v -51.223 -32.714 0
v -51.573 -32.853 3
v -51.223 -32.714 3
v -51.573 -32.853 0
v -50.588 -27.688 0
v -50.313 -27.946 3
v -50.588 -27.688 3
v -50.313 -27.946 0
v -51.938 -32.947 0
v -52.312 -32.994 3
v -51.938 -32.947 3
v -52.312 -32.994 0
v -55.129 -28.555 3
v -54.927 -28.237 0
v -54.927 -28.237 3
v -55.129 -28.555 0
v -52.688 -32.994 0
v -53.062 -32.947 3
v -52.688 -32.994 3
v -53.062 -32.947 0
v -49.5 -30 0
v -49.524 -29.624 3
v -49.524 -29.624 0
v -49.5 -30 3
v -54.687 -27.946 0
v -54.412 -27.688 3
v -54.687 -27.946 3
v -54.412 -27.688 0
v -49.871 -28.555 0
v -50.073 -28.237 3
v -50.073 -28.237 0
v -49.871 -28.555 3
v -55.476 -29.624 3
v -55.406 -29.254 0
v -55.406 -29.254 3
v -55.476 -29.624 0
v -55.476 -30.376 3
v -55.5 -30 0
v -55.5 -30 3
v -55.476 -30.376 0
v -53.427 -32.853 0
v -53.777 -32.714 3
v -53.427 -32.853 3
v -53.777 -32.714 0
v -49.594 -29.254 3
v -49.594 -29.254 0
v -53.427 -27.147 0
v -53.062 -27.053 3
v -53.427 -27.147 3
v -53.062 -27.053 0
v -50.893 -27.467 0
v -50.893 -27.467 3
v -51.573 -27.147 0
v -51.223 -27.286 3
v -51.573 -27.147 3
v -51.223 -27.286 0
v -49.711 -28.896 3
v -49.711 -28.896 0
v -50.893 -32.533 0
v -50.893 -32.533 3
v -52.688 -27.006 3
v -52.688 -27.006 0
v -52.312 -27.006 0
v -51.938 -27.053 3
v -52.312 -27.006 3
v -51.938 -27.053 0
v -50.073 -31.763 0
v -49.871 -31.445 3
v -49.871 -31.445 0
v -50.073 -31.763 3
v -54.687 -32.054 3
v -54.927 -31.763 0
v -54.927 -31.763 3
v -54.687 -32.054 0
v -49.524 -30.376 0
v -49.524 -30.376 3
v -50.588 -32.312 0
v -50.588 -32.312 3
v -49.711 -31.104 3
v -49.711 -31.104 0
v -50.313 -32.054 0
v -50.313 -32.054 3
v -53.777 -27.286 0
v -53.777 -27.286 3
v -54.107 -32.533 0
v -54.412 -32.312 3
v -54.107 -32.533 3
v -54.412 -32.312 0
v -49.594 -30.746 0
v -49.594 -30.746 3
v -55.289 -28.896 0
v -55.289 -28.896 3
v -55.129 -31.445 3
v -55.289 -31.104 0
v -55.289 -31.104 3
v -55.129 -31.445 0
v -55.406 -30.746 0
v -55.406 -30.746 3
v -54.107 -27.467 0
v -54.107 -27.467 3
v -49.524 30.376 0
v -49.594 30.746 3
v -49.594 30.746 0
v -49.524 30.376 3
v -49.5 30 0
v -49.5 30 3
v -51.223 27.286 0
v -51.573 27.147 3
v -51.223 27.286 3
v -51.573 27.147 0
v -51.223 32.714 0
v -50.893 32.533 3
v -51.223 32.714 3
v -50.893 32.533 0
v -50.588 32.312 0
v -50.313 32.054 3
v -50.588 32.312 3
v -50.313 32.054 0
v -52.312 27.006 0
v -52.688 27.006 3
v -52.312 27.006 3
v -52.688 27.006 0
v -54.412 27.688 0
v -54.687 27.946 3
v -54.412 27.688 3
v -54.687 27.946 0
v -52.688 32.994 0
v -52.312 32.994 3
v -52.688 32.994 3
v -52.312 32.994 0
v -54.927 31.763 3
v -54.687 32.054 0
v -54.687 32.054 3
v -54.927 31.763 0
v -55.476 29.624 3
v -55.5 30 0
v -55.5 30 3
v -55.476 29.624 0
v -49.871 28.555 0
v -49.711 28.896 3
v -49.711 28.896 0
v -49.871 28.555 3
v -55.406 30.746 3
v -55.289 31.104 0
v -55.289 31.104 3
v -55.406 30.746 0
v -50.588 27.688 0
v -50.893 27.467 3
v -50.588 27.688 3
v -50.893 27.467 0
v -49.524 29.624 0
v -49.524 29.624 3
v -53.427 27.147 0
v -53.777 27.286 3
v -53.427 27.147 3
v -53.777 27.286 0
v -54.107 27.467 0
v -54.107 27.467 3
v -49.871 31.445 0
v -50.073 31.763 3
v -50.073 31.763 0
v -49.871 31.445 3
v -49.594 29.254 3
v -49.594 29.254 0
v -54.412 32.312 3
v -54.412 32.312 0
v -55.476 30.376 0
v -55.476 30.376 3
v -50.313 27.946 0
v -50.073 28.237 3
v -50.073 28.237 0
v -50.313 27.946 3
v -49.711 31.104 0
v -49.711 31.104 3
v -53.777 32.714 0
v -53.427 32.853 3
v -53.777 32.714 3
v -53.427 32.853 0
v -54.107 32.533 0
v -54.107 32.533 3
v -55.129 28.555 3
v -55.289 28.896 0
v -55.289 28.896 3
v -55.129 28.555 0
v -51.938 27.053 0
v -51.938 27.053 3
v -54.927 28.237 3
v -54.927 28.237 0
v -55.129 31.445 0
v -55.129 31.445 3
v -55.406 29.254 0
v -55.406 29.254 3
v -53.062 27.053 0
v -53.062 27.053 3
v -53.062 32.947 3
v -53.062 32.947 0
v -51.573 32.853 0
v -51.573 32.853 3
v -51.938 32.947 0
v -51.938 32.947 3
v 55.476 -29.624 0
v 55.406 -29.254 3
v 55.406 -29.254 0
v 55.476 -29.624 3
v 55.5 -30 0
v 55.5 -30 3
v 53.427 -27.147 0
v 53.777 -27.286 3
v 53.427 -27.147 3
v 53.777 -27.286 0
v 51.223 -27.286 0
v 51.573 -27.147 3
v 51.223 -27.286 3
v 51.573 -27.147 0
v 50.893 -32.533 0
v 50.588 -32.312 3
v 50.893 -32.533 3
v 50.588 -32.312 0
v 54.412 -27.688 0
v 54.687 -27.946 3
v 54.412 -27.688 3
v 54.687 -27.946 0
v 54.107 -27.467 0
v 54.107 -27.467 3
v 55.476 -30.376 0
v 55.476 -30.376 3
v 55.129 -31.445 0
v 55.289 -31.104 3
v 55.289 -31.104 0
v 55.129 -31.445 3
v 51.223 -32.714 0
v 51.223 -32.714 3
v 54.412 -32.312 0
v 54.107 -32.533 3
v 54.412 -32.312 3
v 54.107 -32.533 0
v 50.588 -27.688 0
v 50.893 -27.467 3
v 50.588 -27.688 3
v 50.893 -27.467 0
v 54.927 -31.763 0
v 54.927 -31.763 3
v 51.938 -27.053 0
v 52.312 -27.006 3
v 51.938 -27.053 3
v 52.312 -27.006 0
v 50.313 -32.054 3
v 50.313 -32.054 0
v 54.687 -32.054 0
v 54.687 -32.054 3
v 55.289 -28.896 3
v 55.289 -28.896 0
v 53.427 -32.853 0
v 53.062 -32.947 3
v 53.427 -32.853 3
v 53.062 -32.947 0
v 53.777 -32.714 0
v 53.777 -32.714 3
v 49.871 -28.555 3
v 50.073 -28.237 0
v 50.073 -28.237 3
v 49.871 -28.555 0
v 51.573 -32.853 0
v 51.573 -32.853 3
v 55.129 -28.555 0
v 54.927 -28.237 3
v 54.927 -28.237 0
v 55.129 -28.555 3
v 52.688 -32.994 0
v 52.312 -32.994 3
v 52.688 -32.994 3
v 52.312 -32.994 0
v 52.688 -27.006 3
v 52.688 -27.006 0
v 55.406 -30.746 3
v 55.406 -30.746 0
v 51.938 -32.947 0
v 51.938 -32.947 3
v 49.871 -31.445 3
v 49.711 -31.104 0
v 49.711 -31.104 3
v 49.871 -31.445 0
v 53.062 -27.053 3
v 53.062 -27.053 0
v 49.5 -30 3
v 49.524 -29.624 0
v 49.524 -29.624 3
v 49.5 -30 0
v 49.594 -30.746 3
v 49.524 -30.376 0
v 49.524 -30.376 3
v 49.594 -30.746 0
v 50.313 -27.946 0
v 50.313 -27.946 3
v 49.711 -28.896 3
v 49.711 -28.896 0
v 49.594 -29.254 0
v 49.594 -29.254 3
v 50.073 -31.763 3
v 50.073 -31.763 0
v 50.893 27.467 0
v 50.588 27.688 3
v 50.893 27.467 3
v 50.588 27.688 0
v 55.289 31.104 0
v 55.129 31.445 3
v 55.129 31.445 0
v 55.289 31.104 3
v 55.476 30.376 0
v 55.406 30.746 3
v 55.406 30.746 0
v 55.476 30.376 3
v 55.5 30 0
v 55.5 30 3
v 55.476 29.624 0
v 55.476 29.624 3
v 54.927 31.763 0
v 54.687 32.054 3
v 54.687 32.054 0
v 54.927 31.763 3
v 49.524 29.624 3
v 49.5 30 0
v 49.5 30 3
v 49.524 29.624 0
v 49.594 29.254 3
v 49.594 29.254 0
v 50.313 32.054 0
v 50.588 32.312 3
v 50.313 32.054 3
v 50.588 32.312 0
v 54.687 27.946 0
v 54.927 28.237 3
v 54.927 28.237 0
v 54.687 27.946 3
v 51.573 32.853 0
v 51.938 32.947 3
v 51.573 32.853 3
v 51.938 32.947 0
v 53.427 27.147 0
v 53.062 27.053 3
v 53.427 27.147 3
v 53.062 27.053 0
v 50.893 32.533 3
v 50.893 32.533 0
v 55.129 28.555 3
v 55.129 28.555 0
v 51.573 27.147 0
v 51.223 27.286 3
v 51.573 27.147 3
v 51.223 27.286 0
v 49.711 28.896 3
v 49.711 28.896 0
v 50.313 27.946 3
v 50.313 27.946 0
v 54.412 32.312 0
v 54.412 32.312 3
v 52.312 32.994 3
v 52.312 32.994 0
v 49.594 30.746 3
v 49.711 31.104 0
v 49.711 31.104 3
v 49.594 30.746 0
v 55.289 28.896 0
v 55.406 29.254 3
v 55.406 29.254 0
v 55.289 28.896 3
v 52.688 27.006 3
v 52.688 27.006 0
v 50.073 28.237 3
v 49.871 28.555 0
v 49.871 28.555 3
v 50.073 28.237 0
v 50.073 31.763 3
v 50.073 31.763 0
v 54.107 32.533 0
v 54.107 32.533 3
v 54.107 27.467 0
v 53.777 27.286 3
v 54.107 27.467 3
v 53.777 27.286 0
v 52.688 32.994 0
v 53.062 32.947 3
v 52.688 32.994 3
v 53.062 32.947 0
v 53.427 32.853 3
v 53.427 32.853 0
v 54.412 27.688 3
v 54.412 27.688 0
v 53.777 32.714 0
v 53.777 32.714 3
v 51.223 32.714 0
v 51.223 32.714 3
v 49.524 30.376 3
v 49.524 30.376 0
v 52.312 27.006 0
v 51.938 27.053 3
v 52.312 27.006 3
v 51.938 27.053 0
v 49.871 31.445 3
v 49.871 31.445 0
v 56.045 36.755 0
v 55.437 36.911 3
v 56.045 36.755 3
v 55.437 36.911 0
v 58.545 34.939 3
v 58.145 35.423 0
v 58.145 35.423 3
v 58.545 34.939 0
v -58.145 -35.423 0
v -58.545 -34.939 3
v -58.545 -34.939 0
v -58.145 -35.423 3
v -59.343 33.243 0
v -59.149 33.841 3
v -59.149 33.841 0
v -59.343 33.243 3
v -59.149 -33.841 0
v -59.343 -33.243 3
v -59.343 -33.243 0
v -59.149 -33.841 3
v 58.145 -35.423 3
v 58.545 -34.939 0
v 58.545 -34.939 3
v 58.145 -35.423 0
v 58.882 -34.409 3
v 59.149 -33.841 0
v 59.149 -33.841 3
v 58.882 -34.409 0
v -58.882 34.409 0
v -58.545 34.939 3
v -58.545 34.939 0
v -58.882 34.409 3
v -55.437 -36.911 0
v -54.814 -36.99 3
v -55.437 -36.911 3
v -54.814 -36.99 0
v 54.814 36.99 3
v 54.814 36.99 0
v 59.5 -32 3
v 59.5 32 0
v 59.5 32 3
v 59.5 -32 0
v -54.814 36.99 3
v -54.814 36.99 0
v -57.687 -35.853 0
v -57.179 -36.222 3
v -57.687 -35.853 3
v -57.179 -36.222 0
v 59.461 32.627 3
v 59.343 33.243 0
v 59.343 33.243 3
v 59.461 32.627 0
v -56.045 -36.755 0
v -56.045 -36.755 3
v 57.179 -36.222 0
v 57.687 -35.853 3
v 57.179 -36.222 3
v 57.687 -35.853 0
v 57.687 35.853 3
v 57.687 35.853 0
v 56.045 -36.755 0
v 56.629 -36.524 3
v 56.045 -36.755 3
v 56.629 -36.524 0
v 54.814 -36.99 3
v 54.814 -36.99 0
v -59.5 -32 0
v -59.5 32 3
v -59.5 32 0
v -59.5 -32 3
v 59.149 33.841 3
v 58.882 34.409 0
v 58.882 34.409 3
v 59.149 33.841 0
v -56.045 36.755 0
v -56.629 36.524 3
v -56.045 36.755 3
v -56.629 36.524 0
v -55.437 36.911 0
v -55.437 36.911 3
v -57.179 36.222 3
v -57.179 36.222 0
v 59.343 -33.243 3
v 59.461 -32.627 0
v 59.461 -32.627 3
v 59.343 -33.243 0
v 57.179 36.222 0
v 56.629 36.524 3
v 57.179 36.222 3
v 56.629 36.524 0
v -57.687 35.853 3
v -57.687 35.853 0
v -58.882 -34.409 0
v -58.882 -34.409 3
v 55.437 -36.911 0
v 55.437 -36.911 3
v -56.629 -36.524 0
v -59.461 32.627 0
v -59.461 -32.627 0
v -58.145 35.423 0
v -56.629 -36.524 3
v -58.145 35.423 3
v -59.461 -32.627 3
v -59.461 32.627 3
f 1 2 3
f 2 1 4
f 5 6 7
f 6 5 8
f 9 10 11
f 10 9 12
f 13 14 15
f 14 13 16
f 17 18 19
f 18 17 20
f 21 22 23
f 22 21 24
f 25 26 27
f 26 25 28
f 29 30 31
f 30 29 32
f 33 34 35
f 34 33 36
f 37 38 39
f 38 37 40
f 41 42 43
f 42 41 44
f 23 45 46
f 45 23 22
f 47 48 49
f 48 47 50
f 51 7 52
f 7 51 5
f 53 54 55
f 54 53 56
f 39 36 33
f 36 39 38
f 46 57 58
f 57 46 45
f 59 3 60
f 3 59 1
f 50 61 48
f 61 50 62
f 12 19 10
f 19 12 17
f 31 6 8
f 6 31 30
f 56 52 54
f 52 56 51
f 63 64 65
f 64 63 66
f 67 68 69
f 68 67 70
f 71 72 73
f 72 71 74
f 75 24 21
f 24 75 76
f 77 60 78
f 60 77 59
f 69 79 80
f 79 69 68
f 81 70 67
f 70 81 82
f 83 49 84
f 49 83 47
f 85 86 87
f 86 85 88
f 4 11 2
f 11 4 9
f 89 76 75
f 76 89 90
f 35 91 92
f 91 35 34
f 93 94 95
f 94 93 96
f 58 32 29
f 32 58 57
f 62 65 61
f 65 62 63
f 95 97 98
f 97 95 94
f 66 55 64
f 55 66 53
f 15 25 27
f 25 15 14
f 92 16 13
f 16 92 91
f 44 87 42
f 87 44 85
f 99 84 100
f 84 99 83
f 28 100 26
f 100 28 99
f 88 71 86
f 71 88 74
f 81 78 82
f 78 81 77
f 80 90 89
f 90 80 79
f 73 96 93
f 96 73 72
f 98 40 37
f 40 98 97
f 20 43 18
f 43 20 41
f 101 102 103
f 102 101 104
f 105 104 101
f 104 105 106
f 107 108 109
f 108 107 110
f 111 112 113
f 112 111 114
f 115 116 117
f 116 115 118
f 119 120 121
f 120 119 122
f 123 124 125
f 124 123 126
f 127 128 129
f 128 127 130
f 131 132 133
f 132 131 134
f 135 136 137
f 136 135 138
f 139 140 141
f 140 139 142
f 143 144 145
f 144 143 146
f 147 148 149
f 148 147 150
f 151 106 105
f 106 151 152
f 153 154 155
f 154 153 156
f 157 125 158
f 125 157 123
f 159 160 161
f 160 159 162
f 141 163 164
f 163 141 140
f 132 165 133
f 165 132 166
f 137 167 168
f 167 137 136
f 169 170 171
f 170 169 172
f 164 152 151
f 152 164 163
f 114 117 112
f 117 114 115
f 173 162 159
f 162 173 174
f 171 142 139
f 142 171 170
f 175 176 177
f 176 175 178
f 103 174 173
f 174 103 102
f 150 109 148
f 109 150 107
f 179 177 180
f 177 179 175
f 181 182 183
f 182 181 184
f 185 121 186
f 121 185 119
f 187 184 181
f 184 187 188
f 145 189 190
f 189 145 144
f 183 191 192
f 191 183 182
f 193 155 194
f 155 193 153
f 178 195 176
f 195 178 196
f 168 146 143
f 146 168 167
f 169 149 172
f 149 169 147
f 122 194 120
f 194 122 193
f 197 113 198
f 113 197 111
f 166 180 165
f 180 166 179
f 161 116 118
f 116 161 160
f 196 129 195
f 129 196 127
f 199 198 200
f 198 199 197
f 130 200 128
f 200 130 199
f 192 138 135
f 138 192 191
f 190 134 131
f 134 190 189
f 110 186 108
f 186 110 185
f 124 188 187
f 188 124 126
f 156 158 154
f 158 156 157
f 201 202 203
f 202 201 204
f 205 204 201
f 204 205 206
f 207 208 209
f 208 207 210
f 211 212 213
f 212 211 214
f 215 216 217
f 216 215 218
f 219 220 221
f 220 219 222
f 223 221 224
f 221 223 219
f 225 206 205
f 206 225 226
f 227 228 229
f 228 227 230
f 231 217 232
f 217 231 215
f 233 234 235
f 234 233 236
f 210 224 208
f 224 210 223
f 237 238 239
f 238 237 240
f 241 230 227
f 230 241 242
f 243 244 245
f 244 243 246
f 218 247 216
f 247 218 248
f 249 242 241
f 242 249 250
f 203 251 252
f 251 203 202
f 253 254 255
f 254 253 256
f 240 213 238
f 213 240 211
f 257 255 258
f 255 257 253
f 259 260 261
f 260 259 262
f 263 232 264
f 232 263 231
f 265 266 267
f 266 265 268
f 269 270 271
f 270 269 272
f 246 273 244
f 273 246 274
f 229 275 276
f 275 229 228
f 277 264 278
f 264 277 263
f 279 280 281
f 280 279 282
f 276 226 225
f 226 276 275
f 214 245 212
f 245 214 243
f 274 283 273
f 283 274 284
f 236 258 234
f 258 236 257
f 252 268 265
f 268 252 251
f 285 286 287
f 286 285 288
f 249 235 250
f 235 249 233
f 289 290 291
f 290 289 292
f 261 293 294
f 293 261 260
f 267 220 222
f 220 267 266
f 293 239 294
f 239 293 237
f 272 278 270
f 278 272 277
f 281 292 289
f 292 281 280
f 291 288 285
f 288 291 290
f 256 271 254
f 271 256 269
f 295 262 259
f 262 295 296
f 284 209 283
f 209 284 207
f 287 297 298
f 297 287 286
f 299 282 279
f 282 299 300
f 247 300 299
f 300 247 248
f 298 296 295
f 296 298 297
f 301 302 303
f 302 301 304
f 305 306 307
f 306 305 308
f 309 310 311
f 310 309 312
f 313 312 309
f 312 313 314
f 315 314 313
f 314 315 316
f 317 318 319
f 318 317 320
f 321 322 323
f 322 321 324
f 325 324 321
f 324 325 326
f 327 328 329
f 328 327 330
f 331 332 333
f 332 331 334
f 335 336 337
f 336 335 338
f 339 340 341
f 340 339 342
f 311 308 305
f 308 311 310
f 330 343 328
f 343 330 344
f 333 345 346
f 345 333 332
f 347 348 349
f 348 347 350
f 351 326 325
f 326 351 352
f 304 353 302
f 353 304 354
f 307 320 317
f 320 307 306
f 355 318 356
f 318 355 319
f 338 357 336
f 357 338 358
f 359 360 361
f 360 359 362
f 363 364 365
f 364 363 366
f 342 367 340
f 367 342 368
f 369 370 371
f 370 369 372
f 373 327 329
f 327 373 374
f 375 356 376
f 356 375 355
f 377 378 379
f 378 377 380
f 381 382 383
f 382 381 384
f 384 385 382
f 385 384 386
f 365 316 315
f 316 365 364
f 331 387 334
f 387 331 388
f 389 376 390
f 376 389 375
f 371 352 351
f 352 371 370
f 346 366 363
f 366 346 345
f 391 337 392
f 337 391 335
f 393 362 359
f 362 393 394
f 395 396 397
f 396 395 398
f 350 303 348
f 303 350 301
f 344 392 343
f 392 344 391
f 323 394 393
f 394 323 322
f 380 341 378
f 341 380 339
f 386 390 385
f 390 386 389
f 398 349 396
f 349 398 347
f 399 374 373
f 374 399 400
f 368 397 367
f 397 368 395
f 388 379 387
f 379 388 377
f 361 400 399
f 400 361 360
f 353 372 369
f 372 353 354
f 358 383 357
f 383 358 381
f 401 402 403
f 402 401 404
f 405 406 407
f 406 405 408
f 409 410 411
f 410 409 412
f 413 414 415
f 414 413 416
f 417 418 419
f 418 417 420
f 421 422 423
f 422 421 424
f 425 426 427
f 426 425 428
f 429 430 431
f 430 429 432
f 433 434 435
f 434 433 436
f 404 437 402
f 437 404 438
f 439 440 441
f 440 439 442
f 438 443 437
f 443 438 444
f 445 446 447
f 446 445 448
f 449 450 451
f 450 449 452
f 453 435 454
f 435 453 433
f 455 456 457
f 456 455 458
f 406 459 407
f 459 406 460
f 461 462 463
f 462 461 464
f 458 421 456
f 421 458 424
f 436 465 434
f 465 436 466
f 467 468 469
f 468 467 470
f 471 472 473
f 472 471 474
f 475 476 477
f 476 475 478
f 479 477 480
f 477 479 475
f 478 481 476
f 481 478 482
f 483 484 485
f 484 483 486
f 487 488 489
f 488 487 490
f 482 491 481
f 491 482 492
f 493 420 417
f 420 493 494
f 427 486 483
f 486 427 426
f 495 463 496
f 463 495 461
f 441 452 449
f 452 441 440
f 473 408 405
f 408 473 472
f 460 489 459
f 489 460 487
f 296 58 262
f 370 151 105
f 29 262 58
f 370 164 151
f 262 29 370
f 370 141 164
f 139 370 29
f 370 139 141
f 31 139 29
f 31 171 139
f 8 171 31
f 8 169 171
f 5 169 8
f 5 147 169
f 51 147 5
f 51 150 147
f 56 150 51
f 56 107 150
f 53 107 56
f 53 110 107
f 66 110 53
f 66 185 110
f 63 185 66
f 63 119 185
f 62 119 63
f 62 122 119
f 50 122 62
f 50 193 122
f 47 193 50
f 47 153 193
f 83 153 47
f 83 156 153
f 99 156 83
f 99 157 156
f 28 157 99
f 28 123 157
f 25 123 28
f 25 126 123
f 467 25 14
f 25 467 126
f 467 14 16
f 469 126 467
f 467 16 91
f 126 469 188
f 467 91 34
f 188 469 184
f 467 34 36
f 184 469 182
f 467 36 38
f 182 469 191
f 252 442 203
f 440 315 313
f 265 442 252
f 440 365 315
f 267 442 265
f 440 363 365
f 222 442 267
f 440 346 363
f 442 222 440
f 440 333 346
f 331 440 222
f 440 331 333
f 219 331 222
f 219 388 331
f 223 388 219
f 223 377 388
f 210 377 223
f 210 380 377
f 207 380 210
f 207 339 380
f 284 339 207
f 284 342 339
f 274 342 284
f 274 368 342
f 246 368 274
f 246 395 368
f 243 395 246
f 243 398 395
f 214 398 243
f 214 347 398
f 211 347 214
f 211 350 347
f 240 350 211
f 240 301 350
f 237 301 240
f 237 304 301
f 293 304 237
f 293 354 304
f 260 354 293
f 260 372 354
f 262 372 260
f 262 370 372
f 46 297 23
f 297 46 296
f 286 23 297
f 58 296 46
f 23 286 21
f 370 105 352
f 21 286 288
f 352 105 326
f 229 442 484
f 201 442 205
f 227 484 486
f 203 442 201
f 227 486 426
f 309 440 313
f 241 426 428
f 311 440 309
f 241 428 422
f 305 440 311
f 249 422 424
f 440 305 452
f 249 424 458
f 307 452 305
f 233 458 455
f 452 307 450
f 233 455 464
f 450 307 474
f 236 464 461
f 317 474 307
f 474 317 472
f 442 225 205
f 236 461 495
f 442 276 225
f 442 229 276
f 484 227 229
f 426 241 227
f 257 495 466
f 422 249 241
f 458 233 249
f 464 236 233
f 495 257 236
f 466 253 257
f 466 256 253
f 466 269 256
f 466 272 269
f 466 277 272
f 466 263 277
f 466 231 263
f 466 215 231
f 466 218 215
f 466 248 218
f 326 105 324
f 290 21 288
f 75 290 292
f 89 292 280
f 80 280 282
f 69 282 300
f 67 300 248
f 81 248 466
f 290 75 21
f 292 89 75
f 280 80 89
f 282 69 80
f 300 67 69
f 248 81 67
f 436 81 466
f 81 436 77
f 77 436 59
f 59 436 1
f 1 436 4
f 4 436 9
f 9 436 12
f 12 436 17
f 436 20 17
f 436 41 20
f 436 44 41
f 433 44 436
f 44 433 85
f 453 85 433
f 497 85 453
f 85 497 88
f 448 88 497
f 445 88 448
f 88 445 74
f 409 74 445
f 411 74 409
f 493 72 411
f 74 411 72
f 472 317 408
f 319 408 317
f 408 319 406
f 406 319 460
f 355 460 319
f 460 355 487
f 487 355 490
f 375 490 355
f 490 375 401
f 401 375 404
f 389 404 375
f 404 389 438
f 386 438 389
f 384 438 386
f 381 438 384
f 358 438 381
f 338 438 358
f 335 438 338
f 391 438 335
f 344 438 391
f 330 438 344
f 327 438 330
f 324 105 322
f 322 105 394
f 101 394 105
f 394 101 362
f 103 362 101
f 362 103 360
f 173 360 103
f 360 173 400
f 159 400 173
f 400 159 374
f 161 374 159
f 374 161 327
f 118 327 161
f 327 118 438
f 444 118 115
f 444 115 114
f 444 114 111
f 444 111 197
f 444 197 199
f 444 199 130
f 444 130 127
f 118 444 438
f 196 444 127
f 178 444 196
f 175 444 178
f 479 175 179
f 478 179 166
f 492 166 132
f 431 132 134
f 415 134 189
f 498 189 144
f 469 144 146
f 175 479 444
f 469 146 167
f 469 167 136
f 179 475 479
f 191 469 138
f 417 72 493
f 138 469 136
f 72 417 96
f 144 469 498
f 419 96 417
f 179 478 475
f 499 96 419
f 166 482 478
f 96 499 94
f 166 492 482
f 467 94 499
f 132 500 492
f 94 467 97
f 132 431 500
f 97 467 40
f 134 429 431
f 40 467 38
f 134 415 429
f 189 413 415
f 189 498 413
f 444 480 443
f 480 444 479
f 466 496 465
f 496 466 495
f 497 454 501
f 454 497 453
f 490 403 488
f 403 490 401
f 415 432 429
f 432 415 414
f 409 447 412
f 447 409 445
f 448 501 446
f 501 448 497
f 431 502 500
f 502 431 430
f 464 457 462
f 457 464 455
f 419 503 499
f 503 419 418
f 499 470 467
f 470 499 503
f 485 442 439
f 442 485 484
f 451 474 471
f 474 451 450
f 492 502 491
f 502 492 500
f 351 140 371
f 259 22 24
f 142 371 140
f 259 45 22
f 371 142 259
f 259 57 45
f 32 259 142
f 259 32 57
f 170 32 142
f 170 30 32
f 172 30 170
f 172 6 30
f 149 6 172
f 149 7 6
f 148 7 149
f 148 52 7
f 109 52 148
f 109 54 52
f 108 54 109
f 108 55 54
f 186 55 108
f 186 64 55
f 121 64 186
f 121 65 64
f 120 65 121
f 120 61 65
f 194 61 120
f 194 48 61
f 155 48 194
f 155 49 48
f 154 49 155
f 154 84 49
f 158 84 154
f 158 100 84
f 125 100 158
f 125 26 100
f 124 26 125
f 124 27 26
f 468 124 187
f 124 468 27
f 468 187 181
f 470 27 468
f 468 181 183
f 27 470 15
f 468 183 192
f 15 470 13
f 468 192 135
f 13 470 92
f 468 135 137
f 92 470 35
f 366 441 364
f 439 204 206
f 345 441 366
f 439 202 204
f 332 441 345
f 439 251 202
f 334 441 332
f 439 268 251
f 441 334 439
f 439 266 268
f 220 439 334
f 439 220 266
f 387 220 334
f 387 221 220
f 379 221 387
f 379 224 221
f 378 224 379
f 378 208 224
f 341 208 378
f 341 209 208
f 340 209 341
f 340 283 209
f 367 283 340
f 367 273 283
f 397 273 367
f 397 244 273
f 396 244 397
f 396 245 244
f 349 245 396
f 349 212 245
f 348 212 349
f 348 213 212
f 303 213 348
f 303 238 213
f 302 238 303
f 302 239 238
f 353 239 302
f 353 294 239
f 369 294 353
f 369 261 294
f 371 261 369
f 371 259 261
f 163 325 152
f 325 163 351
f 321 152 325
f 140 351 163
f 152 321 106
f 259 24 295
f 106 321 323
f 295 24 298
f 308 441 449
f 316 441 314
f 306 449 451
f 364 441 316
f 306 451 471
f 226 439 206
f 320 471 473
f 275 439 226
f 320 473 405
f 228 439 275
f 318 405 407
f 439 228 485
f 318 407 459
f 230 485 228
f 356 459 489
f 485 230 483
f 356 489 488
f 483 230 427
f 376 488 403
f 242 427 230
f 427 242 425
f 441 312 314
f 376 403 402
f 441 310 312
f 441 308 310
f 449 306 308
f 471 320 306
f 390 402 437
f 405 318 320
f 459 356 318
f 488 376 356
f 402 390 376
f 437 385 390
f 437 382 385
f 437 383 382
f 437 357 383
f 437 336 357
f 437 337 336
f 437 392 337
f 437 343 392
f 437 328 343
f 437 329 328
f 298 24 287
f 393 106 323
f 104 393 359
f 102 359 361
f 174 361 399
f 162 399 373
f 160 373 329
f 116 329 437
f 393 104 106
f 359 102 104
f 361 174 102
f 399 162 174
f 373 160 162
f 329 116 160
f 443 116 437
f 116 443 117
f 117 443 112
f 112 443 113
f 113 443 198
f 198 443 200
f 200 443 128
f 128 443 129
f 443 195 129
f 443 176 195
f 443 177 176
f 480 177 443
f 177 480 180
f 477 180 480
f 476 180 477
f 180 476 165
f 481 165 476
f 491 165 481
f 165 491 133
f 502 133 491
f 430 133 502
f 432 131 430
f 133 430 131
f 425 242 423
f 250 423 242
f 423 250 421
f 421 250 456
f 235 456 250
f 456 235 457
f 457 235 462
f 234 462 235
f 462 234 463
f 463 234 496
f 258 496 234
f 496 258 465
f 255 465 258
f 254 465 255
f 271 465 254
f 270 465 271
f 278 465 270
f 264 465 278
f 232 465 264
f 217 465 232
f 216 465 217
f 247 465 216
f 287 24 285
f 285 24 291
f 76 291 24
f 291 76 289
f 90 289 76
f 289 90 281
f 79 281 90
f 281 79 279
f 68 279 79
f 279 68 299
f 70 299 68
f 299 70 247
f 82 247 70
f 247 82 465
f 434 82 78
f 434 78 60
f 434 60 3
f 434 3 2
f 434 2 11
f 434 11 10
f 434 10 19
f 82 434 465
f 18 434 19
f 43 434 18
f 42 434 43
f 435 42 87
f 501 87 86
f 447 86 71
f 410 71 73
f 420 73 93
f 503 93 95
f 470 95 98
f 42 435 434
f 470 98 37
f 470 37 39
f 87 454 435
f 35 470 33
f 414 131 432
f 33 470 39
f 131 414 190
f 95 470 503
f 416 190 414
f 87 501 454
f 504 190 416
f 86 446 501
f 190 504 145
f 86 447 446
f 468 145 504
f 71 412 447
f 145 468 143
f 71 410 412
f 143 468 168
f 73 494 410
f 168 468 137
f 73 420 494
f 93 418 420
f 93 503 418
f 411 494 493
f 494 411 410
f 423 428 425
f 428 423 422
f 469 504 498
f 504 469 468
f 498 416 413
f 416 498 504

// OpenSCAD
$fn = 50;


difference() {
	union() {
		hull() {
			translate(v = [-54.5000000000, 32.0000000000, 0]) {
				cylinder(h = 3, r = 5);
			}
			translate(v = [54.5000000000, 32.0000000000, 0]) {
				cylinder(h = 3, r = 5);
			}
			translate(v = [-54.5000000000, -32.0000000000, 0]) {
				cylinder(h = 3, r = 5);
			}
			translate(v = [54.5000000000, -32.0000000000, 0]) {
				cylinder(h = 3, r = 5);
			}
		}
	}
	union() {
		translate(v = [-52.5000000000, -30.0000000000, -100.0000000000]) {
			cylinder(h = 200, r = 3.0000000000);
		}
		translate(v = [-52.5000000000, 30.0000000000, -100.0000000000]) {
			cylinder(h = 200, r = 3.0000000000);
		}
		translate(v = [52.5000000000, -30.0000000000, -100.0000000000]) {
			cylinder(h = 200, r = 3.0000000000);
		}
		translate(v = [52.5000000000, 30.0000000000, -100.0000000000]) {
			cylinder(h = 200, r = 3.0000000000);
		}
	}
}
